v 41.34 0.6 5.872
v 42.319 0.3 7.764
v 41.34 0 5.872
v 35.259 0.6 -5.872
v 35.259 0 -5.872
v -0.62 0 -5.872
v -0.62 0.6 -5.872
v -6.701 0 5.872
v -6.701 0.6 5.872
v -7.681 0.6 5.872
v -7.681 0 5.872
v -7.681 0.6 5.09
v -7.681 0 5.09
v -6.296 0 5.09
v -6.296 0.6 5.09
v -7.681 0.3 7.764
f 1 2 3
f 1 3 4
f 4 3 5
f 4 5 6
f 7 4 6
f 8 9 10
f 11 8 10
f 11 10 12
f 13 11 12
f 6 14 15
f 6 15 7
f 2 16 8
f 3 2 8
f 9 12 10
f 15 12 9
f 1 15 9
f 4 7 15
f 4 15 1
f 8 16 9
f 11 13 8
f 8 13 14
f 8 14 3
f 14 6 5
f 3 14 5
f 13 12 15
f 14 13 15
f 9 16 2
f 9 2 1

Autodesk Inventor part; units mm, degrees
ref_plane "YZ Plane" through (0, 0, 0) normal (1, 0, 0) x (0, 1, 0)
ref_plane "XZ Plane" through (0, 0, 0) normal (0, 1, 0) x (-1, 0, 0)
ref_plane "XY Plane" through (0, 0, 0) normal (0, 0, 1) x (1, 0, 0)
sketch "Sketch1" plane through (0, 0, 0) normal (0, 1, 0) x (-1, 0, 0)
  line L0 (7.6807, 7.7641) -> (-42.3193, 7.7641)
  line L1 (7.6807, 7.7641) -> (-1.1191, -9.2324)
  line L2 (-17.3193, 7.7641) -> (-17.3193, -12.946)
  line L3 (-42.3193, 7.7641) -> (-33.5196, -9.2324)
  line L4 (-17.3193, -5.8724) -> (0.6205, -5.8724)
  line L5 (-35.2592, -5.8724) -> (-17.3193, -5.8724)
  point P0 (0, 0)
  dimension "d0" = 50
extrude "Extrusion1" add sketch "Sketch1" along normal blind 0.6
ref_plane "Work Plane1" through (17.3193, 0, -40.5229) normal (-1, 0, 0) x (0, 1, 0)
sketch "Sketch2" plane through (17.3193, 0, -40.5229) normal (-1, 0, 0) x (0, 1, 0)
  line L0 (0, -48.2871) -> (0, -34.6505) projected
  line L1 (0, -34.6505) -> (0.6, -34.6505) projected
  line L2 (0.6, -48.2871) -> (0.6, -34.6505) projected
  line L3 (0, -48.2871) -> (0.6, -48.2871) projected
  line L4 (0.3, -48.2871) -> (0.6, -46.3953)
  line L5 (0.6, -34.6505) -> (0.6, -48.2871) projected
  line L6 (0.3, -48.2871) -> (0, -46.3953)
  line L7 (0, -34.6505) -> (0, -48.2871) projected
  point P0 (0, -40.5229)
extrude "Extrusion2" cut sketch "Sketch2" along normal mid plane 50 contours L0 L6 L3 | L4 L2 L3
sketch "Sketch3" plane through (0, 0.6, 0) normal (0, 1, 0) x (1, 0, 0)
  line L0 (-7.6807, -7.7641) -> (-6.7012, -5.8724) projected
  line L1 (42.3193, -7.7641) -> (-7.6807, -7.7641) projected
  line L2 (41.3399, -5.8724) -> (42.3193, -7.7641) projected
  line L3 (-6.7012, -5.8724) -> (41.3399, -5.8724) projected
  line L4 (-0.6205, 5.8724) -> (-6.7012, -5.8724) projected
  line L5 (-6.7012, -5.8724) -> (-7.6807, -5.8724)
  line L6 (-7.6807, -5.8724) -> (-7.6807, -5.0905)
  line L7 (-7.6807, -5.0905) -> (-6.7012, -5.0905)
  line L8 (-6.7012, -5.0905) -> (-6.7012, -5.8724)
  line L9 (-6.7012, -5.8724) -> (41.3399, -5.8724) projected
  line L10 (-7.6807, -5.0905) -> (-5.684, -5.0905)
  line L11 (-5.684, -5.0905) -> (-5.684, -5.8724)
  line L12 (-5.684, -5.8724) -> (-7.6807, -5.8724)
  line L13 (-7.6807, -5.8724) -> (-7.6807, -5.0905)
  point P0 (0, 0)
  point P1 (-6.2964, -5.0905)
extrude "Extrusion3" add sketch "Sketch3" against normal up to surface (0.6 mm away) contours L8 L10 L4 | L5 L6 L7 L8
properties part number "nóż"
